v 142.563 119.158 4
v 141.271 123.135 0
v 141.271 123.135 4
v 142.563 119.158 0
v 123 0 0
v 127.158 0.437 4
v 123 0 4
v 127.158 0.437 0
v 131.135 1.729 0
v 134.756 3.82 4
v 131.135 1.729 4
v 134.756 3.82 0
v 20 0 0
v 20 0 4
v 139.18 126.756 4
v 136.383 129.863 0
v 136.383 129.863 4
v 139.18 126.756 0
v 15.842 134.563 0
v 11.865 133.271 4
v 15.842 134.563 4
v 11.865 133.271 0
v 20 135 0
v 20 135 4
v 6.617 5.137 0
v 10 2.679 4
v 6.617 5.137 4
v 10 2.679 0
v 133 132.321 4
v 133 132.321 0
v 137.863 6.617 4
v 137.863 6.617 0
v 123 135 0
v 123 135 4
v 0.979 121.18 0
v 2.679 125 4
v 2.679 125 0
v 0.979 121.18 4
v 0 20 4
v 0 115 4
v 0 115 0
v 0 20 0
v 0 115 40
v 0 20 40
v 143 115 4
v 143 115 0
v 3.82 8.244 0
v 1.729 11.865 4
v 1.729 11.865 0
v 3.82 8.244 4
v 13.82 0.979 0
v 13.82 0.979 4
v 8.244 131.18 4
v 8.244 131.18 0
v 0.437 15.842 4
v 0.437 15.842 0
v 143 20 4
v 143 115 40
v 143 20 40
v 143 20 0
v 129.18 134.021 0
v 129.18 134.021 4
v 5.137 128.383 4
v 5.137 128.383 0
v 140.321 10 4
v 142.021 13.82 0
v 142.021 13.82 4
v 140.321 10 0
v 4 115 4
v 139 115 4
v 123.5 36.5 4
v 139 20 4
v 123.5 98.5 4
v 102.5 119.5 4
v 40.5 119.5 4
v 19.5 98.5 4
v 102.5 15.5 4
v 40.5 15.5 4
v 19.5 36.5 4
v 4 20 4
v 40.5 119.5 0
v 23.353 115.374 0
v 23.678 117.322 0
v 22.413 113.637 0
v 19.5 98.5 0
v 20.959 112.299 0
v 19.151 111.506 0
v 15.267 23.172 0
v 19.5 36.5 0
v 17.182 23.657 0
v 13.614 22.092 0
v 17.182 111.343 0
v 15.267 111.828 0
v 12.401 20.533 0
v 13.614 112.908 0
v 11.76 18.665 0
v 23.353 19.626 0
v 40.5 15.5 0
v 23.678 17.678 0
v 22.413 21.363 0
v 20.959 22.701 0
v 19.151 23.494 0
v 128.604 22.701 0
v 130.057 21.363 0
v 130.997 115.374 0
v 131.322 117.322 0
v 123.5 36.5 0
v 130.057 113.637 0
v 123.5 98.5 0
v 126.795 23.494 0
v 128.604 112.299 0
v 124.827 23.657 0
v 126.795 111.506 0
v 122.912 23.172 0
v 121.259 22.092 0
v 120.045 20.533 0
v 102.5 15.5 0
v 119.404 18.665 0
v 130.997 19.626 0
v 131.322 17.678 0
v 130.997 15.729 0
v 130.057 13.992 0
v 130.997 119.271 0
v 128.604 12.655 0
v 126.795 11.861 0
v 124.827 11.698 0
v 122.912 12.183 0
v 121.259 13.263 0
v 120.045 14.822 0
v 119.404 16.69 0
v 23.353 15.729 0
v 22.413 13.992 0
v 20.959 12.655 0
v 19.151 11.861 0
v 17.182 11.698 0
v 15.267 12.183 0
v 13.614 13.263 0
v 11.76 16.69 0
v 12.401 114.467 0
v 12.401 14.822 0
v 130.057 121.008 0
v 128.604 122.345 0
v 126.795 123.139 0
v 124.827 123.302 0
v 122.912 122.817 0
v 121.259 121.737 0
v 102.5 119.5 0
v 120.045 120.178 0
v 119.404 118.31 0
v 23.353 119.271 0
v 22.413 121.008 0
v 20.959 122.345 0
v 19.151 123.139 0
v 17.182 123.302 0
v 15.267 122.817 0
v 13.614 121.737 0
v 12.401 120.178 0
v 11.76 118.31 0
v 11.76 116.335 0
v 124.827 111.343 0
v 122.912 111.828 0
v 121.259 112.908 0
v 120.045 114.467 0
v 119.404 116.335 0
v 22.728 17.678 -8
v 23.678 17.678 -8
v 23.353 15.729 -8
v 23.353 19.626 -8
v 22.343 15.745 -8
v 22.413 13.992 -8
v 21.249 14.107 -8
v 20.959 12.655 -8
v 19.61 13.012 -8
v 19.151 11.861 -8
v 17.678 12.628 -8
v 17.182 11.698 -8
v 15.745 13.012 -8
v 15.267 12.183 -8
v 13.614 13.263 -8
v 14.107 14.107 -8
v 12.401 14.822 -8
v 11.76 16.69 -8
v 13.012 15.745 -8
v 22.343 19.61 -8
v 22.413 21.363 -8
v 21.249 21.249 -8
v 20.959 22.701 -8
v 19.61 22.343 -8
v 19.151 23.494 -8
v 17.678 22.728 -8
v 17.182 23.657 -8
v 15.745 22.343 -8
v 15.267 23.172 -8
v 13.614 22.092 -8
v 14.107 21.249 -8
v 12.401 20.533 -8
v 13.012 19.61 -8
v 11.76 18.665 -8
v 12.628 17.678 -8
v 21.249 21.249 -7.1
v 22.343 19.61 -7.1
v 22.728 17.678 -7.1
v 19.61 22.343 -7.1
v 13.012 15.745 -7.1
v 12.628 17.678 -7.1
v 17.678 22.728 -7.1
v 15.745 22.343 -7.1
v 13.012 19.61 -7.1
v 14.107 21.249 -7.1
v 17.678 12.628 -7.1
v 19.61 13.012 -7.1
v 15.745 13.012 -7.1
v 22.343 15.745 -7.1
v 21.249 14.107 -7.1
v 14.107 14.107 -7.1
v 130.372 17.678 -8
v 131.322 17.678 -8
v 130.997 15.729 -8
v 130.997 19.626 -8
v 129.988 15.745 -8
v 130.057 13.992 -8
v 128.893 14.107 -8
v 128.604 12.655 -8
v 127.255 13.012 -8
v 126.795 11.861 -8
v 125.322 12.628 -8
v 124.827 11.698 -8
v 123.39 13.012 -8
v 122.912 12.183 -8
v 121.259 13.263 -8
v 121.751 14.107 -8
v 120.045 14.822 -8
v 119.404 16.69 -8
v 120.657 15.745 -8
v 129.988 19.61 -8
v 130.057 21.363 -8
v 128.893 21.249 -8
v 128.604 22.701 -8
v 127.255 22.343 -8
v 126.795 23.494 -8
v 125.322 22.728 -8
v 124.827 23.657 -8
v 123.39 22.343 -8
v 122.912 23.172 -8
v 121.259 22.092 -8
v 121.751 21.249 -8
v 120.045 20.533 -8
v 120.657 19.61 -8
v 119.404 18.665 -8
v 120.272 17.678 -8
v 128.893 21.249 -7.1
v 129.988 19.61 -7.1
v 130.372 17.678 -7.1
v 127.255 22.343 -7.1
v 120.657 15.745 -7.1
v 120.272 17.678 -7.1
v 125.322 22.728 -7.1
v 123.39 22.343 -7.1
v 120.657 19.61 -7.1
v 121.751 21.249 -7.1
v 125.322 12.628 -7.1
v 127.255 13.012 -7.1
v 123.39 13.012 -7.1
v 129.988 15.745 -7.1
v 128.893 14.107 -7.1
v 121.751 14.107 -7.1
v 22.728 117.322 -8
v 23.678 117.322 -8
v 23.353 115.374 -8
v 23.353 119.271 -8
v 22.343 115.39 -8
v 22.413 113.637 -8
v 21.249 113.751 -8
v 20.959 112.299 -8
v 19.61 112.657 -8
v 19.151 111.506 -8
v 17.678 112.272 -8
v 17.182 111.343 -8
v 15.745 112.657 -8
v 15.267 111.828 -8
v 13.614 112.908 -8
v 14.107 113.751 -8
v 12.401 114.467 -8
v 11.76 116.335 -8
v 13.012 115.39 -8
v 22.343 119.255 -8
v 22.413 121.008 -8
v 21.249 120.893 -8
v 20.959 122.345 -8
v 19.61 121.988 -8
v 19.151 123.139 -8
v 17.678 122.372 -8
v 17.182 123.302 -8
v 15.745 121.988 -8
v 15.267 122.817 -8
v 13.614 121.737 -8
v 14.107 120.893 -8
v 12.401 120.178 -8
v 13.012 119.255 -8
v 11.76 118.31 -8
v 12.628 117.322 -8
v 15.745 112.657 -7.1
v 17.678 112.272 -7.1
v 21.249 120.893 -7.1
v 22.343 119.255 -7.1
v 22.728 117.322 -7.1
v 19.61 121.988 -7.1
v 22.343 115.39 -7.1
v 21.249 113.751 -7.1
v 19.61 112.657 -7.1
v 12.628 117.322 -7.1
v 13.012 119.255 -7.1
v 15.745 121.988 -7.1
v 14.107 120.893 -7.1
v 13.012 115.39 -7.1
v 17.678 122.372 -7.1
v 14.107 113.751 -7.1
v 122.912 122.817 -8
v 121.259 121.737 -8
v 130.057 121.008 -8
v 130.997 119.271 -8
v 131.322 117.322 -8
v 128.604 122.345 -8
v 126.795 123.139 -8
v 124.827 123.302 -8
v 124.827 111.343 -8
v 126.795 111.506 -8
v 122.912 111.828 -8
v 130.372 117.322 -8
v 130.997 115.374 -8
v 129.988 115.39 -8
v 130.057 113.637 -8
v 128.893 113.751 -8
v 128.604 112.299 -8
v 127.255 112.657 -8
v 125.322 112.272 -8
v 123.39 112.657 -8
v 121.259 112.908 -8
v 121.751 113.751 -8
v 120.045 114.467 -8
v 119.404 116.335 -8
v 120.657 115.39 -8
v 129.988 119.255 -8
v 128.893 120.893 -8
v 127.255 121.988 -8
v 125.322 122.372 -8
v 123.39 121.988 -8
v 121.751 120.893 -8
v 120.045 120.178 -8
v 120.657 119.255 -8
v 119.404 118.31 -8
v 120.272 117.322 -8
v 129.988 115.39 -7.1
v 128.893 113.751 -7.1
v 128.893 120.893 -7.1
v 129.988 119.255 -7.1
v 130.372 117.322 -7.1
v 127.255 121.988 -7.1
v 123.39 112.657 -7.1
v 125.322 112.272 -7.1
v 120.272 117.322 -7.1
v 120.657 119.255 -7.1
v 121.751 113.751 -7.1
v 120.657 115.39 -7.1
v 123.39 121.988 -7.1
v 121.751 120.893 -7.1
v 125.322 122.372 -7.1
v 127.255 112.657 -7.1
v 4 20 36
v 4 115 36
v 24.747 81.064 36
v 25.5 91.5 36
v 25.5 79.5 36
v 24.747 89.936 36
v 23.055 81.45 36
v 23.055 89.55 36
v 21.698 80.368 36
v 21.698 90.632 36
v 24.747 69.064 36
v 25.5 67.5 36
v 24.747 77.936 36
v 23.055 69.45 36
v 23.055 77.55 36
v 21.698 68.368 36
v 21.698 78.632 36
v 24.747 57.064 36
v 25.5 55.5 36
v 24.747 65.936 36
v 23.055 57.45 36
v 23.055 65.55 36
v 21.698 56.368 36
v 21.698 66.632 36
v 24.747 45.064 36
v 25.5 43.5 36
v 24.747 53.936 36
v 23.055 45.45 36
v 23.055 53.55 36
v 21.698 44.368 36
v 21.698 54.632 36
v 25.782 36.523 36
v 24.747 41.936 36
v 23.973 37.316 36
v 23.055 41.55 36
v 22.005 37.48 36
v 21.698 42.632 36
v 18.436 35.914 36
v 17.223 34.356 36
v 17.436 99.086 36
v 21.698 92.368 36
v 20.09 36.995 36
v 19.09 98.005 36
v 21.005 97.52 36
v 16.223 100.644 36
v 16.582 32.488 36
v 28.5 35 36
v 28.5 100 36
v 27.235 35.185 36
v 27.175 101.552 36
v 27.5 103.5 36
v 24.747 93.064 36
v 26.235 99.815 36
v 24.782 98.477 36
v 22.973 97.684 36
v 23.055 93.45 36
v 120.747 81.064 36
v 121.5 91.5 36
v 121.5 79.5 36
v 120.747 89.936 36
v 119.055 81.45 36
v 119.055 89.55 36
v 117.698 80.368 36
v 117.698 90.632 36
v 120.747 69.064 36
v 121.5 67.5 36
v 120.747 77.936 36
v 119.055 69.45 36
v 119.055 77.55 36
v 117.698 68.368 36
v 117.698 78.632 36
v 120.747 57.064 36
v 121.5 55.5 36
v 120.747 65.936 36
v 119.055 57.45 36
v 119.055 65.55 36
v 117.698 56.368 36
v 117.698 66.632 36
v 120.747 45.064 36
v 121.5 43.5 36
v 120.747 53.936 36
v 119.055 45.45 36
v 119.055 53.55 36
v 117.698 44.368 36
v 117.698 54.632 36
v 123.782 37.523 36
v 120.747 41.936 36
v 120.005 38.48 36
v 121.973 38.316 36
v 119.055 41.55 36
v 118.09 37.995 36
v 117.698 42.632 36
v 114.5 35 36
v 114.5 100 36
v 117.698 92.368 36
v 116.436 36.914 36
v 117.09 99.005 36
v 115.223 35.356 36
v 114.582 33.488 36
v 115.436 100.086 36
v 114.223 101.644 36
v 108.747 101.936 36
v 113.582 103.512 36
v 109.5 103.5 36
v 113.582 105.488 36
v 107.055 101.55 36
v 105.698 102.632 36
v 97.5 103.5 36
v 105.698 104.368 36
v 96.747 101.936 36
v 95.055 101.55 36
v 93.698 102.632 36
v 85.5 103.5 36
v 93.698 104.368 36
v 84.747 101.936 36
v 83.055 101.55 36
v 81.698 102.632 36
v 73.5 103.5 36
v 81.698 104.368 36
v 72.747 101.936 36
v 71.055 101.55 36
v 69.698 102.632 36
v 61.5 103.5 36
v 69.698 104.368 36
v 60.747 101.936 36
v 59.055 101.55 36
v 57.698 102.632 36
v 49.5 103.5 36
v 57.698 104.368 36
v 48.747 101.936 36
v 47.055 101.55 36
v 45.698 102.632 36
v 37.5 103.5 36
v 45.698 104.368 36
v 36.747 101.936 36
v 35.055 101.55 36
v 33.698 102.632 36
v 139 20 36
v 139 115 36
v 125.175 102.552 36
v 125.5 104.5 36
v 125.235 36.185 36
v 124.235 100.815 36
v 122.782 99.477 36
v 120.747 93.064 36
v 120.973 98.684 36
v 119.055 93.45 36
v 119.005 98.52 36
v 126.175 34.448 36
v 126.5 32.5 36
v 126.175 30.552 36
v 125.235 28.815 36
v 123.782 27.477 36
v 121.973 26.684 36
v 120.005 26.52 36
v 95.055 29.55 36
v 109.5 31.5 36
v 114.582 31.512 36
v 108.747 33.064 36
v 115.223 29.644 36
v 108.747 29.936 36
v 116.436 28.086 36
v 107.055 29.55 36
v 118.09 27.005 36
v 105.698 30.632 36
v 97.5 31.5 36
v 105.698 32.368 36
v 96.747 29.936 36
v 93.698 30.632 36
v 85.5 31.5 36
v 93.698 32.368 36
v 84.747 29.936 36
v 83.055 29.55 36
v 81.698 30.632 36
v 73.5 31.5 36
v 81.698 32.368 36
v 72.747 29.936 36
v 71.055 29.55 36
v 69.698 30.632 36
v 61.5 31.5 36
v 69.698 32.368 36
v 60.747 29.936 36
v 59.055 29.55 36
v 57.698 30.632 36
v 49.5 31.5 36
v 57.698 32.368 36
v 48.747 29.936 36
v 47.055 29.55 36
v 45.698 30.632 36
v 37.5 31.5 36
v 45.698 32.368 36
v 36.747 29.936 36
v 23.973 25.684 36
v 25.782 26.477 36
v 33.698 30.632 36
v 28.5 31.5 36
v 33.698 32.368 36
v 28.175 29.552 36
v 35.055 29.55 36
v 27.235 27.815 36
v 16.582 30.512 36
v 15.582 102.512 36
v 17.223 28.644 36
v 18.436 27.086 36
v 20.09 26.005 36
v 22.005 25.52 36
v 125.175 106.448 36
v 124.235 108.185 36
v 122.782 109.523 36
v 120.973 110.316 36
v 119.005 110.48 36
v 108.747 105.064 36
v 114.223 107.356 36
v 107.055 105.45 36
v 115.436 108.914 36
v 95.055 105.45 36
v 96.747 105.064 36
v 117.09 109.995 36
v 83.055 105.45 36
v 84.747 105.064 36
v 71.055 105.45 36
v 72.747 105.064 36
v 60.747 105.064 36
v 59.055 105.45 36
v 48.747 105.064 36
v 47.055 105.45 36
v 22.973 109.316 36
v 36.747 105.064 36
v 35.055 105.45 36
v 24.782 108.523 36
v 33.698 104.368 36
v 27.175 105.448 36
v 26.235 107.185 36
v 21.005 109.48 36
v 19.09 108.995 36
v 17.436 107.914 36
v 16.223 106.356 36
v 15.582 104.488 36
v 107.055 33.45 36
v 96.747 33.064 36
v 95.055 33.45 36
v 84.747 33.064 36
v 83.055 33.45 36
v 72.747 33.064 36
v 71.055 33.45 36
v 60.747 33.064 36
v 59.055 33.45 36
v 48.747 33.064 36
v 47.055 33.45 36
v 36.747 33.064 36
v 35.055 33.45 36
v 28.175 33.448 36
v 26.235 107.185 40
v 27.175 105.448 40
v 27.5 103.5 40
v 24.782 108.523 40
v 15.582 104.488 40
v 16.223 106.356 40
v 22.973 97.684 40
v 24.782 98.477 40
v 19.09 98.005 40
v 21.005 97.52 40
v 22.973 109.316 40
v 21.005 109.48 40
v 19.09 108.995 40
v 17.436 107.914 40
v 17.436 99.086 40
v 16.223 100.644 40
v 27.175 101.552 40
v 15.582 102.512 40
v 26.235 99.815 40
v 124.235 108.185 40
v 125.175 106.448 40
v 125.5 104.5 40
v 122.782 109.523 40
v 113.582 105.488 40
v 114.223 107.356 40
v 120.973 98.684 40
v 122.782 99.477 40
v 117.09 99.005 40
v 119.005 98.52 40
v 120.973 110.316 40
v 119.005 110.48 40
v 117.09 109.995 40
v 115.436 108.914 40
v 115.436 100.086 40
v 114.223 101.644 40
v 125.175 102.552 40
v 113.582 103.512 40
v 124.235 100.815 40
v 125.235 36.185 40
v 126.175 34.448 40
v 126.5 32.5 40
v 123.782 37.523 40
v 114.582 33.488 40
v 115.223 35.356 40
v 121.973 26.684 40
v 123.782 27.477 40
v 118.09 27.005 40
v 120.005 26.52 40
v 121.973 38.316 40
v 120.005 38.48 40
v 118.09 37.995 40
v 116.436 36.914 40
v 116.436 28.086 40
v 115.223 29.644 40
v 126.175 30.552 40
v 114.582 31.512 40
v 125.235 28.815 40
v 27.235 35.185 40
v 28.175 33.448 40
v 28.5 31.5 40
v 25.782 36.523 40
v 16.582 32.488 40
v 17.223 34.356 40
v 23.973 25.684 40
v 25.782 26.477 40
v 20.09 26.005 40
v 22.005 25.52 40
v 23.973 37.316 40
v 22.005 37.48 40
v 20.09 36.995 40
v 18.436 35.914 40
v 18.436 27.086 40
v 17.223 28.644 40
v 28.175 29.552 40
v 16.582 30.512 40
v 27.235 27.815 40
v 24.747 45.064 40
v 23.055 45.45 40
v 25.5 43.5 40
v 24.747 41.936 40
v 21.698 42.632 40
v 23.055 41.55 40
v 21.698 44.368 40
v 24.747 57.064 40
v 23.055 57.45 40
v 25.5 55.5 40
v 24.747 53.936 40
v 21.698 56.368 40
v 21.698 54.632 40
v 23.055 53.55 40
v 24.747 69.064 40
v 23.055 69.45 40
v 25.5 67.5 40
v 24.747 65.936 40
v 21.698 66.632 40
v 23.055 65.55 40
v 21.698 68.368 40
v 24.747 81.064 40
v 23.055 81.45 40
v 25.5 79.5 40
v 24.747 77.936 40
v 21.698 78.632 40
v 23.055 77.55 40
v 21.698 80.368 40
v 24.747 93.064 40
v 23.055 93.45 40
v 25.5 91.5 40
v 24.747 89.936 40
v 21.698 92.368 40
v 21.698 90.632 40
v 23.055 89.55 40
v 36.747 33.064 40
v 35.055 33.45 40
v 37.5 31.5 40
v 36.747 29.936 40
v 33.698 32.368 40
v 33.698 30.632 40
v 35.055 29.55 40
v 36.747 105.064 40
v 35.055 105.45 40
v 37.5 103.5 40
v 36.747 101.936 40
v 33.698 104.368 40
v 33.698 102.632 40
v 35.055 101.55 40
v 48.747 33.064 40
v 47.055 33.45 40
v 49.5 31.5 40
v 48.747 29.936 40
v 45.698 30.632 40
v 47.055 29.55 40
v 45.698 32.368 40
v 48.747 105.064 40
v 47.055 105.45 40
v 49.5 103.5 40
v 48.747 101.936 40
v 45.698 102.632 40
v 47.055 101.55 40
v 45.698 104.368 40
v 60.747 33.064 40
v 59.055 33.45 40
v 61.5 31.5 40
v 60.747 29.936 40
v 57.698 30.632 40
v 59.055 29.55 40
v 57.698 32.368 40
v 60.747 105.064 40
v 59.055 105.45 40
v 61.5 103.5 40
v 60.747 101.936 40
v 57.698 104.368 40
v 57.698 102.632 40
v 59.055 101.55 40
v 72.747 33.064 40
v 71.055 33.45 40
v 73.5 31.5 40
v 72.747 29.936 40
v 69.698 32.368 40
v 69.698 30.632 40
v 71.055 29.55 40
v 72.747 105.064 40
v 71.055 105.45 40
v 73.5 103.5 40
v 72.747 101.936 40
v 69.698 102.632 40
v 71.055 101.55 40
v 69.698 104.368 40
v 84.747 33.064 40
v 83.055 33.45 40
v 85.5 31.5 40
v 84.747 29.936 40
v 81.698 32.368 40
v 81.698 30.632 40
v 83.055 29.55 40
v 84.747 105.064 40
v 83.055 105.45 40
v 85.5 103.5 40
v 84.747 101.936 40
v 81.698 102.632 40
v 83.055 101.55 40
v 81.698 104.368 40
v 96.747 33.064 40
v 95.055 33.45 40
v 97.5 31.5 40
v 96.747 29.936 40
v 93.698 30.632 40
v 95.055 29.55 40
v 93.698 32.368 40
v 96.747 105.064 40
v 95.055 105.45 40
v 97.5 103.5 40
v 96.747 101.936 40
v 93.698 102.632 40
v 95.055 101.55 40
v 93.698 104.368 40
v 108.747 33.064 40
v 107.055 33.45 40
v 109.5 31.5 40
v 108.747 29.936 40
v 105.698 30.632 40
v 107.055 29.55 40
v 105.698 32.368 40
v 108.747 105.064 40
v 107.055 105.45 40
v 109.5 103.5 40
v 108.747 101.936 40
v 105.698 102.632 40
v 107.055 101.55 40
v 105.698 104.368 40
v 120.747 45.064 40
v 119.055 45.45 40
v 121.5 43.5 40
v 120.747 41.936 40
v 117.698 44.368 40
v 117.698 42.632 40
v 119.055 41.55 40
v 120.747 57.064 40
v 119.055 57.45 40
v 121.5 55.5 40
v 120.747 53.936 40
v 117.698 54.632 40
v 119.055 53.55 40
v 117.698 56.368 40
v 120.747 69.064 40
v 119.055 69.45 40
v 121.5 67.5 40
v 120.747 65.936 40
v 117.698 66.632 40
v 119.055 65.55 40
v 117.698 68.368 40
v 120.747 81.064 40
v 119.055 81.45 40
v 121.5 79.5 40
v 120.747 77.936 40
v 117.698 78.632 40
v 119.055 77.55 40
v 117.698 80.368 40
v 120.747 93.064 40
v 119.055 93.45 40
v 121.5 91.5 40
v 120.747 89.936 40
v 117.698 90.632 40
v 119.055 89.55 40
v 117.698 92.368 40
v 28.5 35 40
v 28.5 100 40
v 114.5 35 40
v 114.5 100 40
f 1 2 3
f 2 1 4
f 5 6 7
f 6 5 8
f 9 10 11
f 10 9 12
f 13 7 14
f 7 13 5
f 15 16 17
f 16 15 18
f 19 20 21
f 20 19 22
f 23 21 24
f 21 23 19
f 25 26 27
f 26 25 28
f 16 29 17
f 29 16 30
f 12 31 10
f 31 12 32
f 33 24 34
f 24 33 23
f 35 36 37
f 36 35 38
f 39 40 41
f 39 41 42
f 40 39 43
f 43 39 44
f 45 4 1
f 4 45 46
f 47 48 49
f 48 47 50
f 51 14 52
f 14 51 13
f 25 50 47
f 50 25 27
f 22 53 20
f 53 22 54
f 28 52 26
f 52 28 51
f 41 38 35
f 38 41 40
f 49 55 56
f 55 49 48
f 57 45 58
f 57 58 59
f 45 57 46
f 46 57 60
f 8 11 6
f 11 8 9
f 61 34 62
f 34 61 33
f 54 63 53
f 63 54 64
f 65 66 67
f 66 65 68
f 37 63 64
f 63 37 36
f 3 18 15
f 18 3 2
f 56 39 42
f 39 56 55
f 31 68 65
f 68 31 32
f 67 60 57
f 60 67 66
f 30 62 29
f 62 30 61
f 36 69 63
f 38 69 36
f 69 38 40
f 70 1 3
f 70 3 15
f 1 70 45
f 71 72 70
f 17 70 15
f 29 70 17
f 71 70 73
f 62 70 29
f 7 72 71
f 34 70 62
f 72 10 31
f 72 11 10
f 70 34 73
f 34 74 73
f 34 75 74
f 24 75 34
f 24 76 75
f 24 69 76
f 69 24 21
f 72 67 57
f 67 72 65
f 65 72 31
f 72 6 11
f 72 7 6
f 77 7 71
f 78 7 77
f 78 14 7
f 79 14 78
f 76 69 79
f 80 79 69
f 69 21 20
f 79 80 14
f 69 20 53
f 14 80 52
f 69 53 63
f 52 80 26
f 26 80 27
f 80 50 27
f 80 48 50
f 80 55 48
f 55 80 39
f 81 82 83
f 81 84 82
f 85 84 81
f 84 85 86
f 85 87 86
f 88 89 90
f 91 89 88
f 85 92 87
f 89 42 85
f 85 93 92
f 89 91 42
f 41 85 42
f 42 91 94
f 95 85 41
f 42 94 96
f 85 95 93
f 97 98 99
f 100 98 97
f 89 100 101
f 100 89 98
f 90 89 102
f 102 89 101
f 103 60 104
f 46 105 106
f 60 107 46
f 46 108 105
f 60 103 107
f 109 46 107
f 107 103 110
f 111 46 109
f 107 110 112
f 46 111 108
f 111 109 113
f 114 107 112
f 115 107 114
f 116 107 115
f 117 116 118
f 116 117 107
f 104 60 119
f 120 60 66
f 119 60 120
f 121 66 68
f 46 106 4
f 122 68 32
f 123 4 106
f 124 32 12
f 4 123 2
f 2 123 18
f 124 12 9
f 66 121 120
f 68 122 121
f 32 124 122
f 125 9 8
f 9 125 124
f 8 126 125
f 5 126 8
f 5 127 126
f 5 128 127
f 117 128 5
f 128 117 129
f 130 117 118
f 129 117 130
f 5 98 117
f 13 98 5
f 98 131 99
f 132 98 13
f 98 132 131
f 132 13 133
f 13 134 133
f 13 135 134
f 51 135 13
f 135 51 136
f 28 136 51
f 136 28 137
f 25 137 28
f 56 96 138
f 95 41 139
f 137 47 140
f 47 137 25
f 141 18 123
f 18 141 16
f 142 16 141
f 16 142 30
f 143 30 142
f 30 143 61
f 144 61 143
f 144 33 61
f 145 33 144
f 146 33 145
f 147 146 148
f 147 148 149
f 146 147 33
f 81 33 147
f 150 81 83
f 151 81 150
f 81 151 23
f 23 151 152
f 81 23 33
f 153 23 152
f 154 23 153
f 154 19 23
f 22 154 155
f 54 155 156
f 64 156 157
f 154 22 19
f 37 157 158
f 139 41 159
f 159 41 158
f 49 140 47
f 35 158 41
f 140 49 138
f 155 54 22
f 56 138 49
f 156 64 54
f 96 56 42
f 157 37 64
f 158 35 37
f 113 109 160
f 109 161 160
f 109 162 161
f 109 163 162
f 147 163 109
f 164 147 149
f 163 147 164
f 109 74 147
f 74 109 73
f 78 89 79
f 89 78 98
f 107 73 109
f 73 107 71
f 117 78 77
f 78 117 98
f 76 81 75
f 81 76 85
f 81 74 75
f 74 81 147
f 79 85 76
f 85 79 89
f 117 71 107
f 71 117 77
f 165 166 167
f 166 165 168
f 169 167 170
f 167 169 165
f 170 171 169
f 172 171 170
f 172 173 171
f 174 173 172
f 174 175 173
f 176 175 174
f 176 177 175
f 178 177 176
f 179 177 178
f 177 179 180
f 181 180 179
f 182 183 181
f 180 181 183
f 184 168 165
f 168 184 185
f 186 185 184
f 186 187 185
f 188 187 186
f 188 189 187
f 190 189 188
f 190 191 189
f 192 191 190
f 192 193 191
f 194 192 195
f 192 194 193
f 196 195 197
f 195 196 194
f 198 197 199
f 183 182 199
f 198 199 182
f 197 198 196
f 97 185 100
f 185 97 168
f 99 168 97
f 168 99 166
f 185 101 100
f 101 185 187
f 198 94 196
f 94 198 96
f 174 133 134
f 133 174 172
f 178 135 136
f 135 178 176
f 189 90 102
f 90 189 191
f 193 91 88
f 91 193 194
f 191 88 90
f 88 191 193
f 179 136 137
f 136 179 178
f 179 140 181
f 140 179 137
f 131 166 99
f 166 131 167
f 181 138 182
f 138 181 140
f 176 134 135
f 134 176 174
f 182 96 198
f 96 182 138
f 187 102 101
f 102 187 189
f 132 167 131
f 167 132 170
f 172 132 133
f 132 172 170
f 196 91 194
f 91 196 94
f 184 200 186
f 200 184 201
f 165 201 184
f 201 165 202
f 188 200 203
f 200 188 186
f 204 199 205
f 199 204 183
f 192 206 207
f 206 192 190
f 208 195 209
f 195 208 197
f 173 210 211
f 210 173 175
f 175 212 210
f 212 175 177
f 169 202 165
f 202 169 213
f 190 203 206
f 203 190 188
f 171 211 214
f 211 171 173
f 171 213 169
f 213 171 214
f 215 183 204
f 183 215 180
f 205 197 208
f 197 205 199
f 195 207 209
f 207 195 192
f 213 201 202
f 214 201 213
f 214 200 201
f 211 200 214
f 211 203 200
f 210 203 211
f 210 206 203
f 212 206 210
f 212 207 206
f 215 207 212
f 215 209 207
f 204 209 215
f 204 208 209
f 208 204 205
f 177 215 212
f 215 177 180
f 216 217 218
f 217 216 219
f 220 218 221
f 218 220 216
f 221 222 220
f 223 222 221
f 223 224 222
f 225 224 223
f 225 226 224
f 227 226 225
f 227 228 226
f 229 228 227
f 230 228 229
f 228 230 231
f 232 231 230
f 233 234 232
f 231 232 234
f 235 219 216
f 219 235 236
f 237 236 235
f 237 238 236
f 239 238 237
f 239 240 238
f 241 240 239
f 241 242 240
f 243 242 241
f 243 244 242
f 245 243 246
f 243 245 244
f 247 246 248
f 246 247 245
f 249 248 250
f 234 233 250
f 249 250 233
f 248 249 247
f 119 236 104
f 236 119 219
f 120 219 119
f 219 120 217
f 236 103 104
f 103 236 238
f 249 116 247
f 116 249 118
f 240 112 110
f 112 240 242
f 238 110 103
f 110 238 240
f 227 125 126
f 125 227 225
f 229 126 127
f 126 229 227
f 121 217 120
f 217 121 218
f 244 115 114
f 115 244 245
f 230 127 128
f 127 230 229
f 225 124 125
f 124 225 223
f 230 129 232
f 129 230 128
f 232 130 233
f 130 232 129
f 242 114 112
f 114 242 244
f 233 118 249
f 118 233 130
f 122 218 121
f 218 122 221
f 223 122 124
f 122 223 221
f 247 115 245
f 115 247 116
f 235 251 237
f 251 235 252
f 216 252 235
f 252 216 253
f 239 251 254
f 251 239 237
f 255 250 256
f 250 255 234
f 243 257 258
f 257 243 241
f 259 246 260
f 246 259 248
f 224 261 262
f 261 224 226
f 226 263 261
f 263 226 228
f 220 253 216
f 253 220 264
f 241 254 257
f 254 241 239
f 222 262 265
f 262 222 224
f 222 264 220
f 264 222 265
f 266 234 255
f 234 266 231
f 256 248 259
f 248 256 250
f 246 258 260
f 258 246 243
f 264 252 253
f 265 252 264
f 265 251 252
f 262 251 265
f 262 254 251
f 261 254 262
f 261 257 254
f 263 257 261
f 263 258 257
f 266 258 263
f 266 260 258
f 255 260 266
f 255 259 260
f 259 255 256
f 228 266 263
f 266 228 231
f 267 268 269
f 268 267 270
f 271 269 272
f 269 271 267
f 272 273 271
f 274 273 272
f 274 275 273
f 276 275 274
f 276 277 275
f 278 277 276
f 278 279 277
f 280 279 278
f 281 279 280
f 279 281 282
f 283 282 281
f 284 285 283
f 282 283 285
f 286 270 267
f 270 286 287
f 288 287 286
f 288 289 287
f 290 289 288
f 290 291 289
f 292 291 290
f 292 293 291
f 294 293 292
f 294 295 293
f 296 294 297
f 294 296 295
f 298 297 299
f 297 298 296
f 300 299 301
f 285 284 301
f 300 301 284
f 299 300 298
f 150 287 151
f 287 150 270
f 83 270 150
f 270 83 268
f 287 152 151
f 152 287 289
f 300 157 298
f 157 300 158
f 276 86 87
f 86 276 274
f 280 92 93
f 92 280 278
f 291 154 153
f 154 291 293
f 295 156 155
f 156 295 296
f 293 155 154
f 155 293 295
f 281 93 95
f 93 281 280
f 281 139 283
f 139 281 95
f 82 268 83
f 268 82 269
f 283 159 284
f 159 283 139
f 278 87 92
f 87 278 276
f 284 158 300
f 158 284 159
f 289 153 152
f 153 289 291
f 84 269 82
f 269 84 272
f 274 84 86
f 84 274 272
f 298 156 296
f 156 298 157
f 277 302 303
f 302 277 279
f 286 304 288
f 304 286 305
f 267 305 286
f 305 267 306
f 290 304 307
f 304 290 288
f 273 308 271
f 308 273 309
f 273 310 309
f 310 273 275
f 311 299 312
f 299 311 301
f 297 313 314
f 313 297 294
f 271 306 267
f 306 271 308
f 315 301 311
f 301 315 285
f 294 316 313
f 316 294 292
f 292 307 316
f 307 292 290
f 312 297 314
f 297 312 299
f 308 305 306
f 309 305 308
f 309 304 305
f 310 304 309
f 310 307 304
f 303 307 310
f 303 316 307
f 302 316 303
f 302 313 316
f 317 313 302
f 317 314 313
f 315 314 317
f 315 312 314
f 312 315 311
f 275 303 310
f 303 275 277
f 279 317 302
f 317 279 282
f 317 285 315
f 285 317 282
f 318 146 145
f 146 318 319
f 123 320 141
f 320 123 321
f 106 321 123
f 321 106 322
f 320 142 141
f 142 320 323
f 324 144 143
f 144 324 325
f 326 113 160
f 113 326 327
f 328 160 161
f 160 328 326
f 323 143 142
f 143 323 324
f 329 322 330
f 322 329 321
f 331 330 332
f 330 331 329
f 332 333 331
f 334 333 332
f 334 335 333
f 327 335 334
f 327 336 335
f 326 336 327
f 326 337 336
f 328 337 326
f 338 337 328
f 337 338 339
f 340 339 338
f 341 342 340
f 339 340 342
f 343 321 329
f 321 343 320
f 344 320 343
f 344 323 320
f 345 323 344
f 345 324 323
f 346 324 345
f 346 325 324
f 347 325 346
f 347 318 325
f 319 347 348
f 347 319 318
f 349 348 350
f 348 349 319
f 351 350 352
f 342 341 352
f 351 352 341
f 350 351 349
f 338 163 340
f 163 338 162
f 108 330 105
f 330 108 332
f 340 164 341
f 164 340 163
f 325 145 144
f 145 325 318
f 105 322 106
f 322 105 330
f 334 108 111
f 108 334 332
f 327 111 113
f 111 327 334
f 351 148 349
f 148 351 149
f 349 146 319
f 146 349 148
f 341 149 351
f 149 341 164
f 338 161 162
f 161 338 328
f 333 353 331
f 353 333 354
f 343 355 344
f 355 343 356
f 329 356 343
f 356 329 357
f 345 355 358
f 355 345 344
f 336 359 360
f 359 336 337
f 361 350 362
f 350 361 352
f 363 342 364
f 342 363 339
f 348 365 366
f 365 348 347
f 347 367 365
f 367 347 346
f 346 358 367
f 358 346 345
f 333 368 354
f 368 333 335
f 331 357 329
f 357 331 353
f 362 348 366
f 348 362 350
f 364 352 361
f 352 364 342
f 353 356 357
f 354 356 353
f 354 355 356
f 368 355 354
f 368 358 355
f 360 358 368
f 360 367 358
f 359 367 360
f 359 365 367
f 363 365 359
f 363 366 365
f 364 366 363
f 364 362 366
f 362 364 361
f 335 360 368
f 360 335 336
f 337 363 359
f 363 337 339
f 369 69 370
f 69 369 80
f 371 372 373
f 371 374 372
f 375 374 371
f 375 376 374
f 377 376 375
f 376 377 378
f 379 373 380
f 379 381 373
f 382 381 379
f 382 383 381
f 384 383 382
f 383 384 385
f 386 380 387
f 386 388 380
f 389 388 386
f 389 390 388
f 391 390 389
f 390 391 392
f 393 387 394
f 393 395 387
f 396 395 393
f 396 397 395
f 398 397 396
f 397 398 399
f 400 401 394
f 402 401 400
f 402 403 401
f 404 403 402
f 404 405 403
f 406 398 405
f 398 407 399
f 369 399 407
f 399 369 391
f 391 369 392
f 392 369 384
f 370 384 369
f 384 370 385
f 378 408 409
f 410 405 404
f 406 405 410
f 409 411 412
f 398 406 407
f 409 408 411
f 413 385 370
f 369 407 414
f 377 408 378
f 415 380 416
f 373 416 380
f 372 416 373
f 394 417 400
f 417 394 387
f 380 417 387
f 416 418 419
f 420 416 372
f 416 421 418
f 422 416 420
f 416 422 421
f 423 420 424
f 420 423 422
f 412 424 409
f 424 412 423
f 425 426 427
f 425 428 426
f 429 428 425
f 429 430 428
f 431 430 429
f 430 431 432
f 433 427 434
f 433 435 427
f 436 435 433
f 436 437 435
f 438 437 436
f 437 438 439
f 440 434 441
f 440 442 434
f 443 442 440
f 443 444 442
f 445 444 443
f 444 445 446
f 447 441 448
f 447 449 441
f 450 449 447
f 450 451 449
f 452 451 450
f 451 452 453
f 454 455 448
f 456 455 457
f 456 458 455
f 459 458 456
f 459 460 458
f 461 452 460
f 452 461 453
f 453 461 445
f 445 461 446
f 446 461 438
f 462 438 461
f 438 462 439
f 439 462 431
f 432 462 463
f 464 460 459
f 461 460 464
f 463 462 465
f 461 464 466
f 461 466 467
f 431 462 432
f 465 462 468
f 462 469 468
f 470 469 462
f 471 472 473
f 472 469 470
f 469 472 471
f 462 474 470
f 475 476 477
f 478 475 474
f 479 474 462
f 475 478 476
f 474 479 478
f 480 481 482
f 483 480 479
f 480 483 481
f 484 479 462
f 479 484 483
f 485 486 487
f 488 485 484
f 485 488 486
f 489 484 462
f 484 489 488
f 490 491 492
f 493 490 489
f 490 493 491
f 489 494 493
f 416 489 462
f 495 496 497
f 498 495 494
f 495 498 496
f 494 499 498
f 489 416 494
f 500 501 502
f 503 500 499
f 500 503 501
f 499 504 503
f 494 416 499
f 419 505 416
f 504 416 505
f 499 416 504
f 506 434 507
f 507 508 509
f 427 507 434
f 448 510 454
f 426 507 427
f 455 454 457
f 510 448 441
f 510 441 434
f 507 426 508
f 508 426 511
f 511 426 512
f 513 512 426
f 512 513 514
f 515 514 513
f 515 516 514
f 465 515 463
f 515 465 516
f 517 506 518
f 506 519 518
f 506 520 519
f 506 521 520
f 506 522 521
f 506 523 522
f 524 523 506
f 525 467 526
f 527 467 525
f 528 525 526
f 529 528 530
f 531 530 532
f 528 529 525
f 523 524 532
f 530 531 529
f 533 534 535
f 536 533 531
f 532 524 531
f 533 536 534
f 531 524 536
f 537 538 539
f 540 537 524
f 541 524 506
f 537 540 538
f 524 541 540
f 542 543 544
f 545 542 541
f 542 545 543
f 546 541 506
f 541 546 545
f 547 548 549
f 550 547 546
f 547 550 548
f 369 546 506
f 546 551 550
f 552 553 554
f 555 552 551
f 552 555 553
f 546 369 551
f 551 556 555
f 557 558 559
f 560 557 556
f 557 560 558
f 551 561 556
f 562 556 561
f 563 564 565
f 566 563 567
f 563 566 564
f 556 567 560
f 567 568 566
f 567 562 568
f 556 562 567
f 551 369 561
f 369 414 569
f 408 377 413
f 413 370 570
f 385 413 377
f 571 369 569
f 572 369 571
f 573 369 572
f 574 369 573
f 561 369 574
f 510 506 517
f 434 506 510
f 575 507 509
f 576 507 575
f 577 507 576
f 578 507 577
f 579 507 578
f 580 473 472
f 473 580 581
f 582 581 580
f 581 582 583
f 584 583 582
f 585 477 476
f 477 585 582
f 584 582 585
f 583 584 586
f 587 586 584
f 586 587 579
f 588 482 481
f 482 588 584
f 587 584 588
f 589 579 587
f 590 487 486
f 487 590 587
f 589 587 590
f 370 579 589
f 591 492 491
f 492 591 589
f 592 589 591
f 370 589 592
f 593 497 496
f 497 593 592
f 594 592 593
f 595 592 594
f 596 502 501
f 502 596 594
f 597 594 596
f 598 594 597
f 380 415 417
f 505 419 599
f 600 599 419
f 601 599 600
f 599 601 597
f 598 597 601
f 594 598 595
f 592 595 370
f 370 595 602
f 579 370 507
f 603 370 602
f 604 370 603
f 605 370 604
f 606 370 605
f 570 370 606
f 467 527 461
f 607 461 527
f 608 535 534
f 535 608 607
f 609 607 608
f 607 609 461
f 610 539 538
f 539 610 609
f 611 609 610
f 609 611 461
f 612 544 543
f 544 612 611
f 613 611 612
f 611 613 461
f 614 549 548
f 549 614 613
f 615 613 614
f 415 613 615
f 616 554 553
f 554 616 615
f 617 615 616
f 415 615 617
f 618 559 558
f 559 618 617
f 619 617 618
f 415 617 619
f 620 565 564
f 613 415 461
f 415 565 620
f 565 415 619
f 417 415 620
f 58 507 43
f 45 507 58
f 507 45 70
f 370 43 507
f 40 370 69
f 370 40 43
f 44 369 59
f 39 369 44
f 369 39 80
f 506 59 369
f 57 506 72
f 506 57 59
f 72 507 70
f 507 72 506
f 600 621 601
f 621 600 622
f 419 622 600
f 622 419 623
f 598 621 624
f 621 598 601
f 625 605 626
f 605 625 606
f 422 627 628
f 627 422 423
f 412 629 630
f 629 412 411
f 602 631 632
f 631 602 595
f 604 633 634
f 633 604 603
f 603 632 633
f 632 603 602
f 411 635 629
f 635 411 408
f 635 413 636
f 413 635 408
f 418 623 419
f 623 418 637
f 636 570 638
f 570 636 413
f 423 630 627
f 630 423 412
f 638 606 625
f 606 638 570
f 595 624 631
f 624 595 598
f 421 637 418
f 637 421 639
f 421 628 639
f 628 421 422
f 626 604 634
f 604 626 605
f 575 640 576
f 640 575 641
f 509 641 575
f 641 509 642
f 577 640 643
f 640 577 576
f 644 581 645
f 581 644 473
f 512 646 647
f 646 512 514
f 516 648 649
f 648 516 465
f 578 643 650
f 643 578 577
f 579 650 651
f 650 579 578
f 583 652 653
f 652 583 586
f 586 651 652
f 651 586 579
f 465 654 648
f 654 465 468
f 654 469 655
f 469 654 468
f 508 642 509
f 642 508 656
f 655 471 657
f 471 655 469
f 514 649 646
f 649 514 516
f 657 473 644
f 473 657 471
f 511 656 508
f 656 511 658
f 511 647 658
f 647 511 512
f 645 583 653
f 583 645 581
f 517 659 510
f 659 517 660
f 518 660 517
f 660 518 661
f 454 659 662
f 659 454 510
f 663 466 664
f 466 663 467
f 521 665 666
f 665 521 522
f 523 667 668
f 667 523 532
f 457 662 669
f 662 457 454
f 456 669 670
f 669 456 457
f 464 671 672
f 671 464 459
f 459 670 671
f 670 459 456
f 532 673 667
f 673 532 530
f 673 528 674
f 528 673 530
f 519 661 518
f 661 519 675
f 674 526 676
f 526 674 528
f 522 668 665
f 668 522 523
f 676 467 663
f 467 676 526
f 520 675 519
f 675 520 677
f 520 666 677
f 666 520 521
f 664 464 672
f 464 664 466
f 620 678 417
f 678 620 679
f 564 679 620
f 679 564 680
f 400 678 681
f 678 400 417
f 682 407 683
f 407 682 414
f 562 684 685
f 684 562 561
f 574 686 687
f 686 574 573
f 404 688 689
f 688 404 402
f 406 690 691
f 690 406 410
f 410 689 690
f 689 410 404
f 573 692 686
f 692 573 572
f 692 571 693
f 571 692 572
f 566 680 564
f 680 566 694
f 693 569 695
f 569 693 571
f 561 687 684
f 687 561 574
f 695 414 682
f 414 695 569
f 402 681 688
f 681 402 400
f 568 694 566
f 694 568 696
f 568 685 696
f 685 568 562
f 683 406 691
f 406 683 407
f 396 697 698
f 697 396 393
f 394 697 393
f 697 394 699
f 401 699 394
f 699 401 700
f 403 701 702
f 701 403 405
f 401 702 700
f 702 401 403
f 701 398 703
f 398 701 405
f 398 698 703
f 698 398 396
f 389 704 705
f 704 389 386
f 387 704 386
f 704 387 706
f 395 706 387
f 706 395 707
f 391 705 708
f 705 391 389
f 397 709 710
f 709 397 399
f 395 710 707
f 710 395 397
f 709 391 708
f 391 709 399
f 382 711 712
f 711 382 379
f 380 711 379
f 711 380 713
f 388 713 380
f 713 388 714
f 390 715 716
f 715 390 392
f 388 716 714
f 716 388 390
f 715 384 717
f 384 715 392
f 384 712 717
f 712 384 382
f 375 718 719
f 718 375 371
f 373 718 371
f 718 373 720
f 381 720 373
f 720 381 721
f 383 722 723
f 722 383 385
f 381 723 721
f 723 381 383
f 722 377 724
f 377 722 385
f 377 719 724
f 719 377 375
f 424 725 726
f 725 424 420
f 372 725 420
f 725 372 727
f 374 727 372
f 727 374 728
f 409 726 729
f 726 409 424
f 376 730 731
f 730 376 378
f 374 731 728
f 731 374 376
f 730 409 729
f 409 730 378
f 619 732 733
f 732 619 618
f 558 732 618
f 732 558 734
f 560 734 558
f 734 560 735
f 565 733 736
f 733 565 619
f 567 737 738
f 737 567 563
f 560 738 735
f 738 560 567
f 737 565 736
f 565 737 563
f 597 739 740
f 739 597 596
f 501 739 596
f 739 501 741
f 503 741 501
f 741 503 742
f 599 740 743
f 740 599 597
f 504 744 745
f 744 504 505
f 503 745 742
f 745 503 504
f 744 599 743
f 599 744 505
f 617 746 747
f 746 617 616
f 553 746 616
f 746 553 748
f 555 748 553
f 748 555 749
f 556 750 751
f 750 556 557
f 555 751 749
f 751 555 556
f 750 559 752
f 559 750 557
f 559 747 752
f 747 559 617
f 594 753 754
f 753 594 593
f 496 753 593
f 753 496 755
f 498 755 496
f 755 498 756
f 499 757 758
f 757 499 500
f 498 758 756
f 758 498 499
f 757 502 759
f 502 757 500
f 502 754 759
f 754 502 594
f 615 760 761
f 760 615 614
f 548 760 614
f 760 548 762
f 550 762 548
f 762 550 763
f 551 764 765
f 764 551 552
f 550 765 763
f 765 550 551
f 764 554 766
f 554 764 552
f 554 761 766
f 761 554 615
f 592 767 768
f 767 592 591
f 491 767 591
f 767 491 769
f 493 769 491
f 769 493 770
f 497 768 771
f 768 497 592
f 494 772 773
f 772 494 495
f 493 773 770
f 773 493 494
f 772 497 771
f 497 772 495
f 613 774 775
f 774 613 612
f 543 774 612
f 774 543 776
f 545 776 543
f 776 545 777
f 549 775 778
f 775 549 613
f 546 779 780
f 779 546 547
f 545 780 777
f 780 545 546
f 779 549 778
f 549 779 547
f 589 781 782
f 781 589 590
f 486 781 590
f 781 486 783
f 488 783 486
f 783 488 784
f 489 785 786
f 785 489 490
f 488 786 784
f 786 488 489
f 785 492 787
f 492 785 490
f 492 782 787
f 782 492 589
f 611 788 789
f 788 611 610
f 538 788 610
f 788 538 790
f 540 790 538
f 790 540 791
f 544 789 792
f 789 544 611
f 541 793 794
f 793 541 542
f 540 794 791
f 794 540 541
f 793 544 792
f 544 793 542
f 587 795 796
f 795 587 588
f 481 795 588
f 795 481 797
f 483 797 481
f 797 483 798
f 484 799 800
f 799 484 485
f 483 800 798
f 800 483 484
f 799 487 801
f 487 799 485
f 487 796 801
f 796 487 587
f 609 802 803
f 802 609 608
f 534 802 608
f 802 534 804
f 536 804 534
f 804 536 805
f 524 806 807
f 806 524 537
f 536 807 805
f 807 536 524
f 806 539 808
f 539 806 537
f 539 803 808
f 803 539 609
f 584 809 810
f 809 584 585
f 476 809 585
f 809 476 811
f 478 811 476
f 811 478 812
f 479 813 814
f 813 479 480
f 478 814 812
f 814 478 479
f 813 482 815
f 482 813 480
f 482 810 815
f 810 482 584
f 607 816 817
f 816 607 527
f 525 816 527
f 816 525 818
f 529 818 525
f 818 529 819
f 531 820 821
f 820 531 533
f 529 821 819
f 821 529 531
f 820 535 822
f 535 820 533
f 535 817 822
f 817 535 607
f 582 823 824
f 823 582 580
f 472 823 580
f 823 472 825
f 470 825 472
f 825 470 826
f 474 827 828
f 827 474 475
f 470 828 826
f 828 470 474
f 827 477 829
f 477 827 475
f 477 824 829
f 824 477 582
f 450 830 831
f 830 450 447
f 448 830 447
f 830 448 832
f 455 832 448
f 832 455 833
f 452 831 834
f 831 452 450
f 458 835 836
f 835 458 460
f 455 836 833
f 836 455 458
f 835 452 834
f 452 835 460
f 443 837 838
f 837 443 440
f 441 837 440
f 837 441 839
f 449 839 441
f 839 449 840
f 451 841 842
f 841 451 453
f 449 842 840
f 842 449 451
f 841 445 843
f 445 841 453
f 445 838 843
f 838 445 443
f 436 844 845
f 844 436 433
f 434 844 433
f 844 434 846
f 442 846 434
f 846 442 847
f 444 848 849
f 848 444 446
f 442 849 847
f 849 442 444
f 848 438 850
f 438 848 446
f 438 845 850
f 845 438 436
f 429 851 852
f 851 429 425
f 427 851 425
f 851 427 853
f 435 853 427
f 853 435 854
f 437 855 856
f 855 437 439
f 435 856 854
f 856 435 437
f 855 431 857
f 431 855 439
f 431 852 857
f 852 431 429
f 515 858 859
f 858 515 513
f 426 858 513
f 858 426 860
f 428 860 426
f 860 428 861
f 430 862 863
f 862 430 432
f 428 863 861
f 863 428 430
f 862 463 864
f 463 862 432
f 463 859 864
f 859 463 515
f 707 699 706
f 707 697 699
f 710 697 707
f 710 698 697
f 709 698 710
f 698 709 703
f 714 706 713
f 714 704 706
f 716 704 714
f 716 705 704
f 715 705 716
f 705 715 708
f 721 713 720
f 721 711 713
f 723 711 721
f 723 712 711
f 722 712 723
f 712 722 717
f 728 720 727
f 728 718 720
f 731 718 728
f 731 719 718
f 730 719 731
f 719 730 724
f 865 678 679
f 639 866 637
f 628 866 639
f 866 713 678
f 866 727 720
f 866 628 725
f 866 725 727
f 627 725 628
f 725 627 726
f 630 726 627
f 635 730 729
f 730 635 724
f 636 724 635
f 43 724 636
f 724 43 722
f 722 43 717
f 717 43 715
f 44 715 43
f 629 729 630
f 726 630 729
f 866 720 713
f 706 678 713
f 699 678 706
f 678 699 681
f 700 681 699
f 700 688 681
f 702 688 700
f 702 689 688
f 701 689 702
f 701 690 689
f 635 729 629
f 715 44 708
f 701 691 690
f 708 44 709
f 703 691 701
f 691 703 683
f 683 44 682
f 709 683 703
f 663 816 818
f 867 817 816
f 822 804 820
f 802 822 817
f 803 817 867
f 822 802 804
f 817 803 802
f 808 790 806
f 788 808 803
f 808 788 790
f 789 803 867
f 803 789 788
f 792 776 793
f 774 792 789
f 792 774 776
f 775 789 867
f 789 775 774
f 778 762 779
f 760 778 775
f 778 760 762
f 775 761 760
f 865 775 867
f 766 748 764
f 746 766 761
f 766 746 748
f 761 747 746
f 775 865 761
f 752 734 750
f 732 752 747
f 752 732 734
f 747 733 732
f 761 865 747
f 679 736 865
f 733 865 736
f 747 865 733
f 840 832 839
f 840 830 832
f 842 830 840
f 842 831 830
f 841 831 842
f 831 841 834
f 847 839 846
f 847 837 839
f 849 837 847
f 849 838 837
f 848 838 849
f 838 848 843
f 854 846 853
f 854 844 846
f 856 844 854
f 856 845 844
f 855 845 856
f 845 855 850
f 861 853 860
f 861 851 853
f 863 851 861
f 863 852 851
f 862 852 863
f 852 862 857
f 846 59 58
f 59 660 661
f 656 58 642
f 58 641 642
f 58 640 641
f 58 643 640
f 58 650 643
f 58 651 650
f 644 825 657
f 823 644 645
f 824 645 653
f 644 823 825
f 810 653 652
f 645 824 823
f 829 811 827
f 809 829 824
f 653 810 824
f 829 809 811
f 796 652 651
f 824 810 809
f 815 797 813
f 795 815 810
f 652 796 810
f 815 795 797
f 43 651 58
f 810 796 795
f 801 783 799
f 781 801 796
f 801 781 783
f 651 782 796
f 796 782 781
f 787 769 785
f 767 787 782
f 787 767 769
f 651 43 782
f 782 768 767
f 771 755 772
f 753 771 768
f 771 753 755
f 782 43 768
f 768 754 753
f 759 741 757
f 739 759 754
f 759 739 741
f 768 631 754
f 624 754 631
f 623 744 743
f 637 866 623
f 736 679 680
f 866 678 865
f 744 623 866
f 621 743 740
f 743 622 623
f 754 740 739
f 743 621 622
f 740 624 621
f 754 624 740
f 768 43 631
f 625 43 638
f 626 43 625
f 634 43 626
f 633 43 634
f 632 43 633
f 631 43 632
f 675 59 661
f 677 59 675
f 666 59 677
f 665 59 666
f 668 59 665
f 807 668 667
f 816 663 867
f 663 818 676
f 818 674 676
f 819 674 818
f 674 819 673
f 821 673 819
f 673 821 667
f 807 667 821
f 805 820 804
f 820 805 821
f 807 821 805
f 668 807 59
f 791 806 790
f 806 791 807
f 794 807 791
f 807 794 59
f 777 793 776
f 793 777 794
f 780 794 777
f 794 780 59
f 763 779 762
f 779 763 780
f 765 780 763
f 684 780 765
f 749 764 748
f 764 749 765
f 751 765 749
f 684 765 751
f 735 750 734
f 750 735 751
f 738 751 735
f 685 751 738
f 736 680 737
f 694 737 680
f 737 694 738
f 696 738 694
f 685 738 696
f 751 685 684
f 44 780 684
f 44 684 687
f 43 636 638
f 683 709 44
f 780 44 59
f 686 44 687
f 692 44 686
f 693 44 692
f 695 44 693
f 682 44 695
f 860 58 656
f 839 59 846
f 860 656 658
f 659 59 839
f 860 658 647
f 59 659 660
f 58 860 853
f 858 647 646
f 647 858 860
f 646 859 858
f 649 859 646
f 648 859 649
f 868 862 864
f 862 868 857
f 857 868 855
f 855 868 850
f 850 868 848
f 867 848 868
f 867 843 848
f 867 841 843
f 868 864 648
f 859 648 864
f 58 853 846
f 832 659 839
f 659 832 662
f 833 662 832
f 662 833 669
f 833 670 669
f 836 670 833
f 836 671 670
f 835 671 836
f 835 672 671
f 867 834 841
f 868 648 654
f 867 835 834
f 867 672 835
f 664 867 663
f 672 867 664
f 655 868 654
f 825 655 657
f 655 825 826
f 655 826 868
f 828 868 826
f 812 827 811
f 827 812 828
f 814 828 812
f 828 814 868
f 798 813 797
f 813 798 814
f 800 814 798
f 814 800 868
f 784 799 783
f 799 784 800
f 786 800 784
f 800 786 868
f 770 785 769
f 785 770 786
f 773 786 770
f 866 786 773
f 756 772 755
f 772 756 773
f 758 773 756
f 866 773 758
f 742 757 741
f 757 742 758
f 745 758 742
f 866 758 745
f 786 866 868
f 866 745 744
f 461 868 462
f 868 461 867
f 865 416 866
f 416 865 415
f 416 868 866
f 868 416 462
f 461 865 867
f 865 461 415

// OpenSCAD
// FiiO K11 R2R Support Frame with Douk Mini A5 Top Support

// Douk Mini A5 parameters
top_plate_thickness = 4;   // thickness of top support plate
top_device_length = 130;  // mm (longer dimension)
top_device_width = 102;   // mm (shorter dimension)
top_vent_hole_length = 86; // central ventilation hole length
top_vent_hole_width = 65;  // central ventilation hole width
footpad_offset = 15;       // distance from edge to center of foot pads

// FiiO K11 dimensions
device_length = 133;  // mm
device_width = 133;   // mm

// Support frame parameters
frame_height = 4;     // height of support frame (mm)
clearance = 1;        // clearance around devices per side (mm)

// Central (custom) octogonal cutout for the FiiO heating pad
parallel_length = 62;  // sides parallel to device borders
half_diagonal = 32;  // angled corner sides

// Ventilation holes
vent_hole_diameter = 4;
vent_hole_spacing = 12;

// Foot parameters
foot_diameter = 12;
foot_height = 8;

// Support structure parameters
pillar_height = 32;        // height from top of base frame to bottom of top support
pillar_thickness = 4;      // thickness of support pillars

// Calculate total dimensions
total_length = device_length + 2*pillar_thickness + 2*clearance;
total_width = device_width + 2*clearance;

module custom_octagon(h) {
    half_parallel = parallel_length / 2;  // sides parallel to device borders
    offset_x = 21;  // horizontal offset for angled sides
    offset_y = 21;  // vertical offset for angled sides

    points = [
        // Starting from top, going clockwise
        [-half_parallel, half_parallel + offset_y],
        [half_parallel, half_parallel + offset_y],
        [half_parallel + offset_x, half_parallel],
        [half_parallel + offset_x, -half_parallel],
        [half_parallel, -half_parallel - offset_y],
        [-half_parallel, -half_parallel - offset_y],
        [-half_parallel - offset_x, -half_parallel],
        [-half_parallel - offset_x, half_parallel]
    ];

    linear_extrude(height = h) {
        polygon(points);
    }
}

module support_frame(rad = 20) {
    rad = min(rad, total_length/2 - 0.1, total_width/2 - 0.1);

    difference() {
        // Main outer frame with rounded corners
        linear_extrude(height = frame_height)
            offset(r = rad)
                translate([rad, rad])
                    square([total_length - 2*rad, total_width - 2*rad], center = false);

        // Central octogonal cutout for heating pad
        translate([total_length/2, total_width/2, -1]) {
            custom_octagon(frame_height + 2);
        }
    }
}

module rubber_feet() {
    // Add rubber feet locations - 25mm diagonal offset from corners
    diagonal_offset = 25 * sqrt(2) / 2;
    foot_positions = [
        [diagonal_offset, diagonal_offset],
        [total_length - diagonal_offset, diagonal_offset],
        [diagonal_offset, total_width - diagonal_offset],
        [total_length - diagonal_offset, total_width - diagonal_offset]
    ];

    for (pos = foot_positions) {
        difference() {
            // Full printed foot
            translate([pos[0], pos[1], -foot_height]) {
                cylinder(h = foot_height, d = foot_diameter);
            }

            // Recess for (10mm) rubber pad
            translate([pos[0], pos[1], -foot_height - 0.1]) {
                cylinder(h = 1, d = 10.1);   // 10.1mm circle, 1mm deep
            }
        }
    }
}

module support_pillars() {
    // Left pillar
    // Remove 20mm from front&rear of the pillar
    translate([0, 20, frame_height])
        cube([pillar_thickness, total_width-40, pillar_height]);

    // Right pillar
    // Remove 20mm from front&rear of the pillar
    translate([total_length - pillar_thickness, 20, frame_height])
        cube([pillar_thickness, total_width-40, pillar_height]);
}

module top_support() {
    // Calculate positioning for Douk Mini A5 (centered on top plate)
    x_offset = (total_length - top_device_length)/2;
    y_offset = (total_width - top_device_width)/2;

    difference() {
        // Main plate
        translate([0, 20, 0]) // Remove 20mm from the up&down of the top plate
            cube([total_length, total_width-40, top_plate_thickness]);

        // Central ventilation hole
        translate([
            (total_length - top_vent_hole_length)/2,
            (total_width - top_vent_hole_width)/2,
            -1
        ]) {
            cube([top_vent_hole_length, top_vent_hole_width, top_plate_thickness + 2]);
        }

        // Cutouts for mounting pads (4 locations relative to A5 device edges that I have measured)
        // You can move the non-slip pads of the A5: I was a bit surprised at first as they are not symetrically placed for me :)
        pad_positions = [
            [x_offset + 15, y_offset + top_device_width - 15],
            [x_offset + top_device_length - 17, y_offset + top_device_width - 14],
            [x_offset + top_device_length - 16, y_offset + 16],
            [x_offset + 16, y_offset + 15]
        ];

        for (pos = pad_positions) {
            translate([pos[0], pos[1], -1]) {
                cylinder(h = top_plate_thickness + 2, d = 12);
            }
        }

        // Ventilation holes in the device area
        device_center_x = x_offset + top_device_length/2;
        device_center_y = y_offset + top_device_width/2;

        // Create ventilation holes in the device area
        for (x = [device_center_x - 48 : vent_hole_spacing : device_center_x + 48]) {
            for (y = [device_center_y - 36 : vent_hole_spacing : device_center_y + 36]) {
                // Only create holes within the device area bounds
                in_device_bounds = (x >= x_offset + 10 &&
                                  x <= x_offset + top_device_length - 10 &&
                                  y >= y_offset + 10 &&
                                  y <= y_offset + top_device_width - 10);

                // Avoid the central ventilation hole area
                outside_central_vent = (x < (total_length - top_vent_hole_length)/2 ||
                                      x > (total_length + top_vent_hole_length)/2 ||
                                      y < (total_width - top_vent_hole_width)/2 ||
                                      y > (total_width + top_vent_hole_width)/2);

                // Check distance to each pad position
                pad1_dist = sqrt(pow(x - (x_offset + 16), 2) + pow(y - (y_offset + top_device_width - 13), 2));
                pad2_dist = sqrt(pow(x - (x_offset + top_device_length - 16), 2) + pow(y - (y_offset + top_device_width - 11), 2));
                pad3_dist = sqrt(pow(x - (x_offset + top_device_length - 15), 2) + pow(y - (y_offset + 13), 2));
                pad4_dist = sqrt(pow(x - (x_offset + 15), 2) + pow(y - (y_offset + 15), 2));
                
                // Only create hole if far enough from all pads
                far_from_pads = (pad1_dist >= 12 && pad2_dist >= 12 && pad3_dist >= 12 && pad4_dist >= 12);

                if (in_device_bounds && outside_central_vent && far_from_pads) {
                    translate([x, y, -1]) {
                        cylinder(h = top_plate_thickness + 2, d = vent_hole_diameter);
                    }
                }
            }
        }
    }
}

// Main assembly
difference() {
    union() {
        support_frame();
        rubber_feet();
        support_pillars();
        // Position top support above pillars
        translate([0, 0, frame_height + pillar_height])
            top_support();
    }
}
